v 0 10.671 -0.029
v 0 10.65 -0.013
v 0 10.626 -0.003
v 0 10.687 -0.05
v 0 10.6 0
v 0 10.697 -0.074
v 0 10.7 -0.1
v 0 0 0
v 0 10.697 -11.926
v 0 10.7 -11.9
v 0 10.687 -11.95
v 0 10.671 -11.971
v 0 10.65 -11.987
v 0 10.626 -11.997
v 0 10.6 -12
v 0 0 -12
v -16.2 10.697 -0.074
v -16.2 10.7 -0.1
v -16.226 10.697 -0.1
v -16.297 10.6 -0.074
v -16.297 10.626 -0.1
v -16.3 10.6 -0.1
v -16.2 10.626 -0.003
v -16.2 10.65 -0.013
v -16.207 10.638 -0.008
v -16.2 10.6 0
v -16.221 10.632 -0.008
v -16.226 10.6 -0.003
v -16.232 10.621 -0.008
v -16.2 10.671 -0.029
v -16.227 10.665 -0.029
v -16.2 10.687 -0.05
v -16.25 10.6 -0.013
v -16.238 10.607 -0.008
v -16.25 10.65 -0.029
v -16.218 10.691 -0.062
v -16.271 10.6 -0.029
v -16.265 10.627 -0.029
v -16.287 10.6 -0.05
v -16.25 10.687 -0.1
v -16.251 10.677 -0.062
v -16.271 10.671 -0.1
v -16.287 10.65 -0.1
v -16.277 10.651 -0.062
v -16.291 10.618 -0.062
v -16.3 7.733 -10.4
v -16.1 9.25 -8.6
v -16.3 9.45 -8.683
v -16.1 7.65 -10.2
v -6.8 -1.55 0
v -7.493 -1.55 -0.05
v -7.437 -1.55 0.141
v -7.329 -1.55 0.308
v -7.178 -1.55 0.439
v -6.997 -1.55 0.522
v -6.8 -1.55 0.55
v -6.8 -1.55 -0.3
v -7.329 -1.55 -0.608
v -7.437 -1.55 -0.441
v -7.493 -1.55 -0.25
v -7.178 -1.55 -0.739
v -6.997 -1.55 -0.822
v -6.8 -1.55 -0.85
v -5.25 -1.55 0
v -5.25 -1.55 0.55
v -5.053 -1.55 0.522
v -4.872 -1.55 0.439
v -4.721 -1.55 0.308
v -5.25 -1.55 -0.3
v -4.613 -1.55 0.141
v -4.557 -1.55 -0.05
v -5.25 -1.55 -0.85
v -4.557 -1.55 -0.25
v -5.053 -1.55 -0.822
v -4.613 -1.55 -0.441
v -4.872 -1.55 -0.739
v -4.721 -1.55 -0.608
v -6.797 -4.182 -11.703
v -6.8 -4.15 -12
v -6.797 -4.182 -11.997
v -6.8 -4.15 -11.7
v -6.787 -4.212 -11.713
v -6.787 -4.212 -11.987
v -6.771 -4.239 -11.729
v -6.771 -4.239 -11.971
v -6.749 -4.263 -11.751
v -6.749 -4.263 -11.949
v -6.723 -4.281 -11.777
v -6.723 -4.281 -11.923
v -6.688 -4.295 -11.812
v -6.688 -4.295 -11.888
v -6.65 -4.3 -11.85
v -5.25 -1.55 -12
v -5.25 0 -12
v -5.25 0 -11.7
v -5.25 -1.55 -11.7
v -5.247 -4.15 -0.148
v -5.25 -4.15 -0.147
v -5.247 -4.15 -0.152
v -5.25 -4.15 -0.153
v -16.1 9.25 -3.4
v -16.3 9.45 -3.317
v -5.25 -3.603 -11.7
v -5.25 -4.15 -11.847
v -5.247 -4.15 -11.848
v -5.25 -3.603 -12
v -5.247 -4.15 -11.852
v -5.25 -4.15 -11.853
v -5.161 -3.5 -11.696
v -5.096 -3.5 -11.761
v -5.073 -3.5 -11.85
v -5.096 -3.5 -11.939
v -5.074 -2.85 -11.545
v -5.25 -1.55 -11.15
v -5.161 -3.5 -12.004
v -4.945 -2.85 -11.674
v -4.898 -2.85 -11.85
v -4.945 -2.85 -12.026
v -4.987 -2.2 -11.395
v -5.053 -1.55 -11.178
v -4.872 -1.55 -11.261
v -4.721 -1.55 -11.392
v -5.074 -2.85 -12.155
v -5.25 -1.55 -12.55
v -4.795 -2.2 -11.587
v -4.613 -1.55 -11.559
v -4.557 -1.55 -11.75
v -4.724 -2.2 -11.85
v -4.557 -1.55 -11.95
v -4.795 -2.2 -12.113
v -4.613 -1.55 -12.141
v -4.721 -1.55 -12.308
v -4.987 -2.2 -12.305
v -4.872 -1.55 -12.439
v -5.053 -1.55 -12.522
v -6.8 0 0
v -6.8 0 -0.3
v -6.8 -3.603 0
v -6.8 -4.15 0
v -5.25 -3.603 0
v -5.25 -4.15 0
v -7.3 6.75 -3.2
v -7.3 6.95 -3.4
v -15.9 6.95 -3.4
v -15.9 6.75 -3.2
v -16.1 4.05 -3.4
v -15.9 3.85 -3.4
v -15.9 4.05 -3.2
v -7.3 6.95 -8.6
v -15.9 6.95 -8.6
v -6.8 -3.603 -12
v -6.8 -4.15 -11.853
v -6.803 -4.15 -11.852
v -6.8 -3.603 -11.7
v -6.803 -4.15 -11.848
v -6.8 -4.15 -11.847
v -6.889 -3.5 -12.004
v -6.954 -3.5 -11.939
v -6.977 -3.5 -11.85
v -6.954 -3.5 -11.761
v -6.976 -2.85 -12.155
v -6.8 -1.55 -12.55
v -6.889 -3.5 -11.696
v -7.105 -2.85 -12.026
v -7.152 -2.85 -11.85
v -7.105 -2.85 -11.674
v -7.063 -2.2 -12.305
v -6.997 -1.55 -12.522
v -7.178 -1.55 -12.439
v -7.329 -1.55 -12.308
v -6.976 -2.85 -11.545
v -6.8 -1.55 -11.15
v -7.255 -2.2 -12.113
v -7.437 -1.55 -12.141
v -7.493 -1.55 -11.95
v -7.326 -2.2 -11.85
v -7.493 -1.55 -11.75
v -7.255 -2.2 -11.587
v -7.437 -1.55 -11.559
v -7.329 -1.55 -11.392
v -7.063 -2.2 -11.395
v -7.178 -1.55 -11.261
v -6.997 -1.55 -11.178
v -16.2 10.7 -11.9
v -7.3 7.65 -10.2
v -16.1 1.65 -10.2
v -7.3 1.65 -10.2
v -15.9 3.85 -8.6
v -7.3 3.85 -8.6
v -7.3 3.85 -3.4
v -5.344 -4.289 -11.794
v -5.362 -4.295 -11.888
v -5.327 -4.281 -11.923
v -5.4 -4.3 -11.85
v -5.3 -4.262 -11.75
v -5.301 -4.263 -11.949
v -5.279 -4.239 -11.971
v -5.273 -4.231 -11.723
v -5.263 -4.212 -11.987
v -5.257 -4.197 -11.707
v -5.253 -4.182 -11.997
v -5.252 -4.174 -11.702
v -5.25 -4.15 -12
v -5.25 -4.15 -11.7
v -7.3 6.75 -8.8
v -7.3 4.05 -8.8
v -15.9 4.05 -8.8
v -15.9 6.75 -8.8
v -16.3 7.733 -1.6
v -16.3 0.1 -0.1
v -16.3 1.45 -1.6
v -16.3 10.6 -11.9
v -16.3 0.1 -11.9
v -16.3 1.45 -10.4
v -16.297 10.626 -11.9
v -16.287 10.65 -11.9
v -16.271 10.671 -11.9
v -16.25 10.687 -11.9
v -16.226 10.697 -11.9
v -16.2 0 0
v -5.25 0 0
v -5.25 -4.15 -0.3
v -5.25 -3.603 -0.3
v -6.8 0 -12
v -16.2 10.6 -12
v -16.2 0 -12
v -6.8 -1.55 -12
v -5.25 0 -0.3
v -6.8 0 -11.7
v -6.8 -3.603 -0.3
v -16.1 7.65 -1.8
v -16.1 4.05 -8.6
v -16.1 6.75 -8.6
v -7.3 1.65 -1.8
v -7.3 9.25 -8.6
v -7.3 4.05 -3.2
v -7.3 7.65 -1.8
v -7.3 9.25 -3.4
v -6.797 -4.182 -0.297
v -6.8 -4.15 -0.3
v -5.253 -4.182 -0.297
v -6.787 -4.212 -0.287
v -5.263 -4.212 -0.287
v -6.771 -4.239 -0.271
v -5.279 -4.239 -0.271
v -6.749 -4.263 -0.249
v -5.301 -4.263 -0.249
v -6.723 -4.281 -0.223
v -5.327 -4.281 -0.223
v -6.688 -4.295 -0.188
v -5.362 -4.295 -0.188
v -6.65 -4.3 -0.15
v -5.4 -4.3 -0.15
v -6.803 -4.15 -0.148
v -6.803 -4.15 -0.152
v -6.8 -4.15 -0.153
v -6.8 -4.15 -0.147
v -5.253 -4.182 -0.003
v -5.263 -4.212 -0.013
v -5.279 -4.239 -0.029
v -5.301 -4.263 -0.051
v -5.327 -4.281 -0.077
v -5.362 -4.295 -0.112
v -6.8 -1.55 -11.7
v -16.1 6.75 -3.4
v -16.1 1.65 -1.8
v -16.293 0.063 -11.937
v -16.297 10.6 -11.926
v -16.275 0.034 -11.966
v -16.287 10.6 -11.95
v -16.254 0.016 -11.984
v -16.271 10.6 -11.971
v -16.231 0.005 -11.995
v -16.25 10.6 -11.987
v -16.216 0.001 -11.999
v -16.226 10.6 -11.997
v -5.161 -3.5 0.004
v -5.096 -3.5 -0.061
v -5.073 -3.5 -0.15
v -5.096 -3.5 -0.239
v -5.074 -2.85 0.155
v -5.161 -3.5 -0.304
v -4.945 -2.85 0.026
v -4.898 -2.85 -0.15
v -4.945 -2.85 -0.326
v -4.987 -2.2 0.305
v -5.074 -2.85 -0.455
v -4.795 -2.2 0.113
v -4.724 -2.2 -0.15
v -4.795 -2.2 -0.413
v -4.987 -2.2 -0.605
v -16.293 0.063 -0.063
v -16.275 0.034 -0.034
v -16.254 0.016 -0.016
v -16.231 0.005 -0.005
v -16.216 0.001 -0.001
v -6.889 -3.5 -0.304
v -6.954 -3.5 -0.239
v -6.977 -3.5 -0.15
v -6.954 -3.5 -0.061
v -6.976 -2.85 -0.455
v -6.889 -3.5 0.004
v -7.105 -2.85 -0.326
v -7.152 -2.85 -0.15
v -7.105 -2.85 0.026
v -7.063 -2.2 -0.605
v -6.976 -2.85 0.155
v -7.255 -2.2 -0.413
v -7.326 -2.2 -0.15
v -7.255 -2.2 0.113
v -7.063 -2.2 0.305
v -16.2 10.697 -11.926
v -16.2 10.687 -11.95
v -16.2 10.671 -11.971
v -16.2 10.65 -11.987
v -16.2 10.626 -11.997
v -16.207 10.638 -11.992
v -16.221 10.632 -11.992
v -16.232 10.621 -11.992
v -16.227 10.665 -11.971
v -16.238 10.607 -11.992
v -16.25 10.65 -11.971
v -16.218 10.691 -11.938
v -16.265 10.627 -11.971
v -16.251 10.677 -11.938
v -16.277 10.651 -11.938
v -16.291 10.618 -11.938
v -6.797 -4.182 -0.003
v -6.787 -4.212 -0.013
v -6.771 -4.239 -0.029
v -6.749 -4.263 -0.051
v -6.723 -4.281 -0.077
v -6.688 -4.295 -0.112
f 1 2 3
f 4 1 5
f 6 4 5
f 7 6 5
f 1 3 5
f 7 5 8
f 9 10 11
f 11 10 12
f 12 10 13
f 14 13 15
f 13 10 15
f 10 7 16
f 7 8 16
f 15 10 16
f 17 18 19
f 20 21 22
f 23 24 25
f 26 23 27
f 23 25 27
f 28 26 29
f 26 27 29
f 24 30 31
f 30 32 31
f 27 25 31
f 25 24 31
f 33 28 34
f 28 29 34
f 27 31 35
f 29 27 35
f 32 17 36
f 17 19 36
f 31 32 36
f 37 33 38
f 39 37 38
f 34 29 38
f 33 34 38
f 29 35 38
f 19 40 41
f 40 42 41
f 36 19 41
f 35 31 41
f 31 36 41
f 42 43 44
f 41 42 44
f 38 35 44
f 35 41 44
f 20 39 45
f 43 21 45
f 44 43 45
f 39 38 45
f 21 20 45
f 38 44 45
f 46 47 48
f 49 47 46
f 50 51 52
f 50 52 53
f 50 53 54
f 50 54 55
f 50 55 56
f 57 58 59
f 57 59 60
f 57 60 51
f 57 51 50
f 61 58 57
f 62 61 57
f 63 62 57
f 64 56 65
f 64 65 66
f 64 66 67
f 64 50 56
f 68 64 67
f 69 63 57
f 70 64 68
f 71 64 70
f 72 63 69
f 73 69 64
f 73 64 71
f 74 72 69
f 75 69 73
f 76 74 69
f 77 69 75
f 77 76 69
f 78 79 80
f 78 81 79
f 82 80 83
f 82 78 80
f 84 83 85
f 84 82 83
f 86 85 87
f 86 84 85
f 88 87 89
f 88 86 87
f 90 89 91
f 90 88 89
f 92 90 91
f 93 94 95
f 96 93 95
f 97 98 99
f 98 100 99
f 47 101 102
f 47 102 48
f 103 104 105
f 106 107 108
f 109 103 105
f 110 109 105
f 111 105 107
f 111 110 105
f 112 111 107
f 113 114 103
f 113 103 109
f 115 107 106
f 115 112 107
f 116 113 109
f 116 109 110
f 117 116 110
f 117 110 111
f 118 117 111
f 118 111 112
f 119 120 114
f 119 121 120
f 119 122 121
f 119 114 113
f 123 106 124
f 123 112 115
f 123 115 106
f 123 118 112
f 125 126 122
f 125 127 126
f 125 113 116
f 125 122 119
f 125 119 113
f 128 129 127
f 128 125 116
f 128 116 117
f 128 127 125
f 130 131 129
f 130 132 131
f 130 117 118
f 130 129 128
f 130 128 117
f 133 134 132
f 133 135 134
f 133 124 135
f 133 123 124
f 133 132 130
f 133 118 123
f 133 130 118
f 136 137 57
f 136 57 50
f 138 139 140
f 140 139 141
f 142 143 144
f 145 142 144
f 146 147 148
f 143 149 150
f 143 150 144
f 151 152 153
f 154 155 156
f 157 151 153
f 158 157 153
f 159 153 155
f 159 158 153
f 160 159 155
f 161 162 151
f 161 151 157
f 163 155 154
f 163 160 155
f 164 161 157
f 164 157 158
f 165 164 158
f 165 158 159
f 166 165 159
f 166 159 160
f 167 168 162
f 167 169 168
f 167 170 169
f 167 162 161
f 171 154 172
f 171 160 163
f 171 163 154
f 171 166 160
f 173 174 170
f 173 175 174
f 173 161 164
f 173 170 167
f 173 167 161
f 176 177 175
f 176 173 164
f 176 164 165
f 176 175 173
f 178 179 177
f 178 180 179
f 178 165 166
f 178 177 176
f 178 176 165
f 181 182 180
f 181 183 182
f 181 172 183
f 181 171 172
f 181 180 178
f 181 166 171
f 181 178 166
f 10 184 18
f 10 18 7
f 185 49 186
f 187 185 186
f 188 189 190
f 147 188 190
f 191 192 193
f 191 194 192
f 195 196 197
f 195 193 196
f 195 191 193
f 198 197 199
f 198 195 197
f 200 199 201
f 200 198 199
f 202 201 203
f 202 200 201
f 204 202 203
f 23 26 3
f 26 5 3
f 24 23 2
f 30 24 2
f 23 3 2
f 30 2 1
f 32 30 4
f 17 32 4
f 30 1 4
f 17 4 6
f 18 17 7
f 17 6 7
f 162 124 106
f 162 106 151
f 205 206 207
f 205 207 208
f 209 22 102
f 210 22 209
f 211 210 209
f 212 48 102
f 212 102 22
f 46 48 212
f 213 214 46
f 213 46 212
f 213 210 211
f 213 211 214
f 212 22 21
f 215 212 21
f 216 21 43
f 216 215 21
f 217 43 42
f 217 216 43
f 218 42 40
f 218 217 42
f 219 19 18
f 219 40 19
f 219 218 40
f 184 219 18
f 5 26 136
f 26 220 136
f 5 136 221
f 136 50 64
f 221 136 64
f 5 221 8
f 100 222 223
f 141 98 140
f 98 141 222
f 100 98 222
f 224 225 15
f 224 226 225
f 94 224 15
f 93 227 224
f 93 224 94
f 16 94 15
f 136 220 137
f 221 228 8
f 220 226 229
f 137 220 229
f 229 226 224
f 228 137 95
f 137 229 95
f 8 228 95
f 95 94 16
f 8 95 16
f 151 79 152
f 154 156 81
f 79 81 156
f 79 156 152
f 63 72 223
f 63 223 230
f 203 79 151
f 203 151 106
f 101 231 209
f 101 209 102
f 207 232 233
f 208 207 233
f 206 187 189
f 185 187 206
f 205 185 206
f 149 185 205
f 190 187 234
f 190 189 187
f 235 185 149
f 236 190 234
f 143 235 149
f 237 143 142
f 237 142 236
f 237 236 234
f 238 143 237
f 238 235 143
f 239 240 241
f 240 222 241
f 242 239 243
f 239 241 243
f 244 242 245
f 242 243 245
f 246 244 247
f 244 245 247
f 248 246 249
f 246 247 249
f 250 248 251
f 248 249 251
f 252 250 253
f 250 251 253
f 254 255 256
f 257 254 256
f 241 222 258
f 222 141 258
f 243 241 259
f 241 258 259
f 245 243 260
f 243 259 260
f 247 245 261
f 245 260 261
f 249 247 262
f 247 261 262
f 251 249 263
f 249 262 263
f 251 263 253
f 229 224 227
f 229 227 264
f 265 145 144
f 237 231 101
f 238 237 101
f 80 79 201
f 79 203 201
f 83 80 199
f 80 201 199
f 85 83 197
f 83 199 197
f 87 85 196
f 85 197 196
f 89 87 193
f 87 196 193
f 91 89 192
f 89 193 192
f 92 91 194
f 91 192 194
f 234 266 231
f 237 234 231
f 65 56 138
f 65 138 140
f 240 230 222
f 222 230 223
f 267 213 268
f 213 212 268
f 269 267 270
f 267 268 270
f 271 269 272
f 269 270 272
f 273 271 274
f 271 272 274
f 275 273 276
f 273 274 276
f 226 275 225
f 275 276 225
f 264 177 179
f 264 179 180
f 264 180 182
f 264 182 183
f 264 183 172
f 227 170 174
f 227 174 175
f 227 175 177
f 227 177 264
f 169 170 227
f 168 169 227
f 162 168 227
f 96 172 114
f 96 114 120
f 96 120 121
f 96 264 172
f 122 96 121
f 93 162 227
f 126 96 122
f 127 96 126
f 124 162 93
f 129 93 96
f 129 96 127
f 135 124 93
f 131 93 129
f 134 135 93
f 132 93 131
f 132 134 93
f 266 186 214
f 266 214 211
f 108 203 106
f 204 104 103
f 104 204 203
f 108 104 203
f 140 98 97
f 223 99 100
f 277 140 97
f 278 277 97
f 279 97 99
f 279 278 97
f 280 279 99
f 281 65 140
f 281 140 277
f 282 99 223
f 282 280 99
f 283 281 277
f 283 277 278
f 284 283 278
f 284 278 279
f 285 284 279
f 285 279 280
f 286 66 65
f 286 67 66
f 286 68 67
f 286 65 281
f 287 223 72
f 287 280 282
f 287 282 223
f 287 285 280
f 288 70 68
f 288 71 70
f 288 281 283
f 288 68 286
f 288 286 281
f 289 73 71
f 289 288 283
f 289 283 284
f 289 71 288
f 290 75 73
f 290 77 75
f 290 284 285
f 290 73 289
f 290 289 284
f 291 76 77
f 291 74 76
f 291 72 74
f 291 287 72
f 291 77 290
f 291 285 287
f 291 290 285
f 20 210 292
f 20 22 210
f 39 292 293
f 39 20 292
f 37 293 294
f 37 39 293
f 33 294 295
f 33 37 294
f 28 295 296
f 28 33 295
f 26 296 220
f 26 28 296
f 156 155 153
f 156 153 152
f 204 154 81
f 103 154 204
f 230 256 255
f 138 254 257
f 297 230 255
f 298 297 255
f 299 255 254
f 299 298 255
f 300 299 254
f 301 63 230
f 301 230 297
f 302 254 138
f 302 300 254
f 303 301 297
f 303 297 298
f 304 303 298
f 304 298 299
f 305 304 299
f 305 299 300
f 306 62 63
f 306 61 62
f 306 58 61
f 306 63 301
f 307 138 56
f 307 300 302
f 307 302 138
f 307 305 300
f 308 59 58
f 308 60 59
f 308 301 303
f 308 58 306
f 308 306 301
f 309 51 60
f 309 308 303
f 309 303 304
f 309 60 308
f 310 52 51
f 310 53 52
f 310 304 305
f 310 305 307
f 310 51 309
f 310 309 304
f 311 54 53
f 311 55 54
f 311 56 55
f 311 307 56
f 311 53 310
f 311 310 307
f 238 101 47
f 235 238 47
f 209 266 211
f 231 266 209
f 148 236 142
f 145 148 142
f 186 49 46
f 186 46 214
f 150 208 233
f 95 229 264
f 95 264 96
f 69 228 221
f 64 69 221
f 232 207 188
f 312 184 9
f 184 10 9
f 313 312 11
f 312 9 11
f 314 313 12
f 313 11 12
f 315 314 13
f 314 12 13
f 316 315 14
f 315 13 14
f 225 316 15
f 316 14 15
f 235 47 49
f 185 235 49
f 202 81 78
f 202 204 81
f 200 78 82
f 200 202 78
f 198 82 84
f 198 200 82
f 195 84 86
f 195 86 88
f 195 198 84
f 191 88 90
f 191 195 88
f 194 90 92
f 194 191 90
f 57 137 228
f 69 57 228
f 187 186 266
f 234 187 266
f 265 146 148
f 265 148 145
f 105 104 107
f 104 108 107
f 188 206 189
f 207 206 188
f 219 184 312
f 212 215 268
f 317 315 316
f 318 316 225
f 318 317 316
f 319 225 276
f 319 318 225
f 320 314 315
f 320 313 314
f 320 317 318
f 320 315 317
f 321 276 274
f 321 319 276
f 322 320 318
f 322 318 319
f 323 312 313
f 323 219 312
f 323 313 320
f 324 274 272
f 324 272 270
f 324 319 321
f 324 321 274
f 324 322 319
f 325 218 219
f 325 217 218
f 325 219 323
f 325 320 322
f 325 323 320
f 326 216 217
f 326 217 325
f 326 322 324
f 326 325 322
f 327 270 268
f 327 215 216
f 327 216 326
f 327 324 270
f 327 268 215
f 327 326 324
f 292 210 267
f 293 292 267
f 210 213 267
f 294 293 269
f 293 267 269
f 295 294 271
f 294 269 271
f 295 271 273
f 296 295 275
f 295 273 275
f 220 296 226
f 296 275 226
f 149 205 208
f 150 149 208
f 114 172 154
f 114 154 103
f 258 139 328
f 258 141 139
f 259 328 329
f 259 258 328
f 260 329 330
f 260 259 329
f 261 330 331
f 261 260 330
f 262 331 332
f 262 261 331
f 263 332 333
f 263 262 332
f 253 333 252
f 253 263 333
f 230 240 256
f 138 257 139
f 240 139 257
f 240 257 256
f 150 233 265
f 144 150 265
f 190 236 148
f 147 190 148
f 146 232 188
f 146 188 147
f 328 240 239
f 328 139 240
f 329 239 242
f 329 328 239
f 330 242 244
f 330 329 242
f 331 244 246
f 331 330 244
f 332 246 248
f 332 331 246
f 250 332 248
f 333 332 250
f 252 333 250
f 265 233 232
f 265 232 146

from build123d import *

# Parameters (mm, degrees)
ESQUISSE1_W                  = 16.3
ESQUISSE1_H                  = 12
BOSS_EXTRU_1_DEPTH           = 10.7
ENL_V_MAT_EXTRU_1_DEPTH      = 9
ESQUISSE4_W                  = 5.6
ESQUISSE4_H                  = 3.1
BOSS_EXTRU_2_DEPTH           = 8.8
CHANFREIN1_SIZE              = 0.2
CONG_1_R                     = 0.1
ESQUISSE5_W                  = 1.55
ESQUISSE5_H                  = 0.3
BOSS_EXTRU_3_DEPTH           = 4.3
BOSS_EXTRU_4_DEPTH           = 2.6
BOSS_EXTRU_4_DRAFT           = -15
BOSS_EXTRU_4_PROFILE_2_DEPTH = 2.6
BOSS_EXTRU_4_PROFILE_2_DRAFT = -15
CONG_3_R                     = 0.15


with BuildPart() as part:
    # Esquisse1 → Boss.-Extru.1 (new body)
    with BuildSketch(Plane(origin=(0, 0, 0), x_dir=(1, 0, 0), z_dir=(0, 1, 0))):
        with Locations((-8.15, 6)):
            Rectangle(ESQUISSE1_W, ESQUISSE1_H)
    extrude(amount=BOSS_EXTRU_1_DEPTH)

    # Esquisse2 → Enlèv. mat.-Extru.1 (cut)
    with BuildSketch(Plane.ZY.offset(16.3)):
        Polygon((-8.6, 9.25), (-10.2, 7.65), (-10.2, 1.65), (-1.8, 1.65), (-1.8, 7.65), (-3.4, 9.25), align=None)
    extrude(amount=-ENL_V_MAT_EXTRU_1_DEPTH, mode=Mode.SUBTRACT)

    # Esquisse4 → Boss.-Extru.2 (add)
    with BuildSketch(Plane.ZY.offset(7.3)):
        with Locations((-6, 5.4)):
            Rectangle(ESQUISSE4_W, ESQUISSE4_H)
    extrude(amount=BOSS_EXTRU_2_DEPTH)

    # Chanfrein1
    chanfrein1_edges = [part.edges().sort_by_distance(p)[0] for p in [
        (-16.3, 4.65, -10.2),
        (-16.3, 1.65, -6),
        (-16.3, 4.65, -1.8),
        (-16.3, 8.45, -2.6),
        (-16.3, 9.25, -6),
        (-16.3, 8.45, -9.4),
        (-11.7, 6.95, -8.8),
        (-11.7, 3.85, -8.8),
        (-11.7, 3.85, -3.2),
        (-11.7, 6.95, -3.2),
        (-16.1, 5.4, -8.8),
        (-16.1, 3.85, -6),
        (-16.1, 5.4, -3.2),
        (-16.1, 6.95, -6),
    ]]
    chamfer(chanfrein1_edges, length=CHANFREIN1_SIZE)

    # Congé1
    cong_1_edges = [part.edges().sort_by_distance(p)[0] for p in [
        (-16.3, 10.7, -6),
        (-8.15, 10.7, 0),
        (-16.3, 0, -6),
        (-8.15, 10.7, -12),
        (-16.3, 5.35, 0),
        (-16.3, 5.35, -12),
    ]]
    fillet(cong_1_edges, radius=CONG_1_R)

    # Esquisse5 → Boss.-Extru.3 (add)
    with BuildSketch(Plane.XZ):
        with Locations((-6.025, -0.15)):
            Rectangle(ESQUISSE5_W, ESQUISSE5_H)
        with Locations((-6.025, -11.85)):
            Rectangle(ESQUISSE5_W, ESQUISSE5_H)
    extrude(amount=BOSS_EXTRU_3_DEPTH)


with BuildPart() as boss_extru_4_tool:
    # Esquisse6 → Boss.-Extru.4 (with draft: the straight prism first)
    with BuildSketch(Plane(origin=(0, -1.55, 0), x_dir=(1, 0, 0), z_dir=(0, 1, 0))):
        with BuildLine():
            ThreePointArc((-6.8, 0.85), (-7.5, 0.15), (-6.8, -0.55))
            Line((-6.8, -0.55), (-5.25, -0.55))
            ThreePointArc((-5.25, -0.55), (-4.55, 0.15), (-5.25, 0.85))
            Line((-5.25, 0.85), (-6.8, 0.85))
        make_face()
    extrude(amount=-BOSS_EXTRU_4_DEPTH)
    # Boss.-Extru.4: the draft: its side faces are tilted about the plane it starts from
    boss_extru_4_sides = [boss_extru_4_tool.faces().sort_by_distance(p)[0] for p in [
        (-6.025, -2.85, 0.55),
        (-4.55, -2.85, -0.15),
        (-6.025, -2.85, -0.85),
        (-7.5, -2.85, -0.15),
    ]]
    draft(boss_extru_4_sides, Plane(origin=(0, -1.55, 0), x_dir=(1, 0, 0), z_dir=(0, 1, 0)), BOSS_EXTRU_4_DRAFT)


with BuildPart() as part_1:
    add(part.part)

    # Boss.-Extru.4: add boss_extru_4_tool
    add(boss_extru_4_tool.part)


with BuildPart() as boss_extru_4_profile_2_tool:
    # Esquisse6 → Boss.-Extru.4 profile 2 (with draft: the straight prism first)
    with BuildSketch(Plane(origin=(0, -1.55, 0), x_dir=(1, 0, 0), z_dir=(0, 1, 0))):
        with BuildLine():
            ThreePointArc((-6.8, 12.55), (-7.5, 11.85), (-6.8, 11.15))
            Line((-6.8, 11.15), (-5.25, 11.15))
            ThreePointArc((-5.25, 11.15), (-4.55, 11.85), (-5.25, 12.55))
            Line((-5.25, 12.55), (-6.8, 12.55))
        make_face()
    extrude(amount=-BOSS_EXTRU_4_PROFILE_2_DEPTH)
    # Boss.-Extru.4 profile 2: the draft: its side faces are tilted about the plane it starts from
    boss_extru_4_profile_2_sides = [boss_extru_4_profile_2_tool.faces().sort_by_distance(p)[0] for p in [
        (-7.5, -2.85, -11.85),
        (-6.025, -2.85, -11.15),
        (-4.55, -2.85, -11.85),
        (-6.025, -2.85, -12.55),
    ]]
    draft(boss_extru_4_profile_2_sides, Plane(origin=(0, -1.55, 0), x_dir=(1, 0, 0), z_dir=(0, 1, 0)), BOSS_EXTRU_4_PROFILE_2_DRAFT)


with BuildPart() as part_2:
    add(part_1.part)

    # Boss.-Extru.4 profile 2: add boss_extru_4_profile_2_tool
    add(boss_extru_4_profile_2_tool.part)

    # Congé3
    cong_3_edges = [part_2.edges().sort_by_distance(p)[0] for p in [
        (-6.8, -4.3, -0.15),
        (-6.025, -4.3, -0.3),
        (-5.25, -4.3, -0.15),
        (-6.025, -4.3, 0),
        (-6.025, -4.3, -12),
        (-5.25, -4.3, -11.85),
        (-6.025, -4.3, -11.7),
        (-6.8, -4.3, -11.85),
    ]]
    fillet(cong_3_edges, radius=CONG_3_R - 0.0001)  # a hair under: the kernel refuses the full size


solid = part_2.part
